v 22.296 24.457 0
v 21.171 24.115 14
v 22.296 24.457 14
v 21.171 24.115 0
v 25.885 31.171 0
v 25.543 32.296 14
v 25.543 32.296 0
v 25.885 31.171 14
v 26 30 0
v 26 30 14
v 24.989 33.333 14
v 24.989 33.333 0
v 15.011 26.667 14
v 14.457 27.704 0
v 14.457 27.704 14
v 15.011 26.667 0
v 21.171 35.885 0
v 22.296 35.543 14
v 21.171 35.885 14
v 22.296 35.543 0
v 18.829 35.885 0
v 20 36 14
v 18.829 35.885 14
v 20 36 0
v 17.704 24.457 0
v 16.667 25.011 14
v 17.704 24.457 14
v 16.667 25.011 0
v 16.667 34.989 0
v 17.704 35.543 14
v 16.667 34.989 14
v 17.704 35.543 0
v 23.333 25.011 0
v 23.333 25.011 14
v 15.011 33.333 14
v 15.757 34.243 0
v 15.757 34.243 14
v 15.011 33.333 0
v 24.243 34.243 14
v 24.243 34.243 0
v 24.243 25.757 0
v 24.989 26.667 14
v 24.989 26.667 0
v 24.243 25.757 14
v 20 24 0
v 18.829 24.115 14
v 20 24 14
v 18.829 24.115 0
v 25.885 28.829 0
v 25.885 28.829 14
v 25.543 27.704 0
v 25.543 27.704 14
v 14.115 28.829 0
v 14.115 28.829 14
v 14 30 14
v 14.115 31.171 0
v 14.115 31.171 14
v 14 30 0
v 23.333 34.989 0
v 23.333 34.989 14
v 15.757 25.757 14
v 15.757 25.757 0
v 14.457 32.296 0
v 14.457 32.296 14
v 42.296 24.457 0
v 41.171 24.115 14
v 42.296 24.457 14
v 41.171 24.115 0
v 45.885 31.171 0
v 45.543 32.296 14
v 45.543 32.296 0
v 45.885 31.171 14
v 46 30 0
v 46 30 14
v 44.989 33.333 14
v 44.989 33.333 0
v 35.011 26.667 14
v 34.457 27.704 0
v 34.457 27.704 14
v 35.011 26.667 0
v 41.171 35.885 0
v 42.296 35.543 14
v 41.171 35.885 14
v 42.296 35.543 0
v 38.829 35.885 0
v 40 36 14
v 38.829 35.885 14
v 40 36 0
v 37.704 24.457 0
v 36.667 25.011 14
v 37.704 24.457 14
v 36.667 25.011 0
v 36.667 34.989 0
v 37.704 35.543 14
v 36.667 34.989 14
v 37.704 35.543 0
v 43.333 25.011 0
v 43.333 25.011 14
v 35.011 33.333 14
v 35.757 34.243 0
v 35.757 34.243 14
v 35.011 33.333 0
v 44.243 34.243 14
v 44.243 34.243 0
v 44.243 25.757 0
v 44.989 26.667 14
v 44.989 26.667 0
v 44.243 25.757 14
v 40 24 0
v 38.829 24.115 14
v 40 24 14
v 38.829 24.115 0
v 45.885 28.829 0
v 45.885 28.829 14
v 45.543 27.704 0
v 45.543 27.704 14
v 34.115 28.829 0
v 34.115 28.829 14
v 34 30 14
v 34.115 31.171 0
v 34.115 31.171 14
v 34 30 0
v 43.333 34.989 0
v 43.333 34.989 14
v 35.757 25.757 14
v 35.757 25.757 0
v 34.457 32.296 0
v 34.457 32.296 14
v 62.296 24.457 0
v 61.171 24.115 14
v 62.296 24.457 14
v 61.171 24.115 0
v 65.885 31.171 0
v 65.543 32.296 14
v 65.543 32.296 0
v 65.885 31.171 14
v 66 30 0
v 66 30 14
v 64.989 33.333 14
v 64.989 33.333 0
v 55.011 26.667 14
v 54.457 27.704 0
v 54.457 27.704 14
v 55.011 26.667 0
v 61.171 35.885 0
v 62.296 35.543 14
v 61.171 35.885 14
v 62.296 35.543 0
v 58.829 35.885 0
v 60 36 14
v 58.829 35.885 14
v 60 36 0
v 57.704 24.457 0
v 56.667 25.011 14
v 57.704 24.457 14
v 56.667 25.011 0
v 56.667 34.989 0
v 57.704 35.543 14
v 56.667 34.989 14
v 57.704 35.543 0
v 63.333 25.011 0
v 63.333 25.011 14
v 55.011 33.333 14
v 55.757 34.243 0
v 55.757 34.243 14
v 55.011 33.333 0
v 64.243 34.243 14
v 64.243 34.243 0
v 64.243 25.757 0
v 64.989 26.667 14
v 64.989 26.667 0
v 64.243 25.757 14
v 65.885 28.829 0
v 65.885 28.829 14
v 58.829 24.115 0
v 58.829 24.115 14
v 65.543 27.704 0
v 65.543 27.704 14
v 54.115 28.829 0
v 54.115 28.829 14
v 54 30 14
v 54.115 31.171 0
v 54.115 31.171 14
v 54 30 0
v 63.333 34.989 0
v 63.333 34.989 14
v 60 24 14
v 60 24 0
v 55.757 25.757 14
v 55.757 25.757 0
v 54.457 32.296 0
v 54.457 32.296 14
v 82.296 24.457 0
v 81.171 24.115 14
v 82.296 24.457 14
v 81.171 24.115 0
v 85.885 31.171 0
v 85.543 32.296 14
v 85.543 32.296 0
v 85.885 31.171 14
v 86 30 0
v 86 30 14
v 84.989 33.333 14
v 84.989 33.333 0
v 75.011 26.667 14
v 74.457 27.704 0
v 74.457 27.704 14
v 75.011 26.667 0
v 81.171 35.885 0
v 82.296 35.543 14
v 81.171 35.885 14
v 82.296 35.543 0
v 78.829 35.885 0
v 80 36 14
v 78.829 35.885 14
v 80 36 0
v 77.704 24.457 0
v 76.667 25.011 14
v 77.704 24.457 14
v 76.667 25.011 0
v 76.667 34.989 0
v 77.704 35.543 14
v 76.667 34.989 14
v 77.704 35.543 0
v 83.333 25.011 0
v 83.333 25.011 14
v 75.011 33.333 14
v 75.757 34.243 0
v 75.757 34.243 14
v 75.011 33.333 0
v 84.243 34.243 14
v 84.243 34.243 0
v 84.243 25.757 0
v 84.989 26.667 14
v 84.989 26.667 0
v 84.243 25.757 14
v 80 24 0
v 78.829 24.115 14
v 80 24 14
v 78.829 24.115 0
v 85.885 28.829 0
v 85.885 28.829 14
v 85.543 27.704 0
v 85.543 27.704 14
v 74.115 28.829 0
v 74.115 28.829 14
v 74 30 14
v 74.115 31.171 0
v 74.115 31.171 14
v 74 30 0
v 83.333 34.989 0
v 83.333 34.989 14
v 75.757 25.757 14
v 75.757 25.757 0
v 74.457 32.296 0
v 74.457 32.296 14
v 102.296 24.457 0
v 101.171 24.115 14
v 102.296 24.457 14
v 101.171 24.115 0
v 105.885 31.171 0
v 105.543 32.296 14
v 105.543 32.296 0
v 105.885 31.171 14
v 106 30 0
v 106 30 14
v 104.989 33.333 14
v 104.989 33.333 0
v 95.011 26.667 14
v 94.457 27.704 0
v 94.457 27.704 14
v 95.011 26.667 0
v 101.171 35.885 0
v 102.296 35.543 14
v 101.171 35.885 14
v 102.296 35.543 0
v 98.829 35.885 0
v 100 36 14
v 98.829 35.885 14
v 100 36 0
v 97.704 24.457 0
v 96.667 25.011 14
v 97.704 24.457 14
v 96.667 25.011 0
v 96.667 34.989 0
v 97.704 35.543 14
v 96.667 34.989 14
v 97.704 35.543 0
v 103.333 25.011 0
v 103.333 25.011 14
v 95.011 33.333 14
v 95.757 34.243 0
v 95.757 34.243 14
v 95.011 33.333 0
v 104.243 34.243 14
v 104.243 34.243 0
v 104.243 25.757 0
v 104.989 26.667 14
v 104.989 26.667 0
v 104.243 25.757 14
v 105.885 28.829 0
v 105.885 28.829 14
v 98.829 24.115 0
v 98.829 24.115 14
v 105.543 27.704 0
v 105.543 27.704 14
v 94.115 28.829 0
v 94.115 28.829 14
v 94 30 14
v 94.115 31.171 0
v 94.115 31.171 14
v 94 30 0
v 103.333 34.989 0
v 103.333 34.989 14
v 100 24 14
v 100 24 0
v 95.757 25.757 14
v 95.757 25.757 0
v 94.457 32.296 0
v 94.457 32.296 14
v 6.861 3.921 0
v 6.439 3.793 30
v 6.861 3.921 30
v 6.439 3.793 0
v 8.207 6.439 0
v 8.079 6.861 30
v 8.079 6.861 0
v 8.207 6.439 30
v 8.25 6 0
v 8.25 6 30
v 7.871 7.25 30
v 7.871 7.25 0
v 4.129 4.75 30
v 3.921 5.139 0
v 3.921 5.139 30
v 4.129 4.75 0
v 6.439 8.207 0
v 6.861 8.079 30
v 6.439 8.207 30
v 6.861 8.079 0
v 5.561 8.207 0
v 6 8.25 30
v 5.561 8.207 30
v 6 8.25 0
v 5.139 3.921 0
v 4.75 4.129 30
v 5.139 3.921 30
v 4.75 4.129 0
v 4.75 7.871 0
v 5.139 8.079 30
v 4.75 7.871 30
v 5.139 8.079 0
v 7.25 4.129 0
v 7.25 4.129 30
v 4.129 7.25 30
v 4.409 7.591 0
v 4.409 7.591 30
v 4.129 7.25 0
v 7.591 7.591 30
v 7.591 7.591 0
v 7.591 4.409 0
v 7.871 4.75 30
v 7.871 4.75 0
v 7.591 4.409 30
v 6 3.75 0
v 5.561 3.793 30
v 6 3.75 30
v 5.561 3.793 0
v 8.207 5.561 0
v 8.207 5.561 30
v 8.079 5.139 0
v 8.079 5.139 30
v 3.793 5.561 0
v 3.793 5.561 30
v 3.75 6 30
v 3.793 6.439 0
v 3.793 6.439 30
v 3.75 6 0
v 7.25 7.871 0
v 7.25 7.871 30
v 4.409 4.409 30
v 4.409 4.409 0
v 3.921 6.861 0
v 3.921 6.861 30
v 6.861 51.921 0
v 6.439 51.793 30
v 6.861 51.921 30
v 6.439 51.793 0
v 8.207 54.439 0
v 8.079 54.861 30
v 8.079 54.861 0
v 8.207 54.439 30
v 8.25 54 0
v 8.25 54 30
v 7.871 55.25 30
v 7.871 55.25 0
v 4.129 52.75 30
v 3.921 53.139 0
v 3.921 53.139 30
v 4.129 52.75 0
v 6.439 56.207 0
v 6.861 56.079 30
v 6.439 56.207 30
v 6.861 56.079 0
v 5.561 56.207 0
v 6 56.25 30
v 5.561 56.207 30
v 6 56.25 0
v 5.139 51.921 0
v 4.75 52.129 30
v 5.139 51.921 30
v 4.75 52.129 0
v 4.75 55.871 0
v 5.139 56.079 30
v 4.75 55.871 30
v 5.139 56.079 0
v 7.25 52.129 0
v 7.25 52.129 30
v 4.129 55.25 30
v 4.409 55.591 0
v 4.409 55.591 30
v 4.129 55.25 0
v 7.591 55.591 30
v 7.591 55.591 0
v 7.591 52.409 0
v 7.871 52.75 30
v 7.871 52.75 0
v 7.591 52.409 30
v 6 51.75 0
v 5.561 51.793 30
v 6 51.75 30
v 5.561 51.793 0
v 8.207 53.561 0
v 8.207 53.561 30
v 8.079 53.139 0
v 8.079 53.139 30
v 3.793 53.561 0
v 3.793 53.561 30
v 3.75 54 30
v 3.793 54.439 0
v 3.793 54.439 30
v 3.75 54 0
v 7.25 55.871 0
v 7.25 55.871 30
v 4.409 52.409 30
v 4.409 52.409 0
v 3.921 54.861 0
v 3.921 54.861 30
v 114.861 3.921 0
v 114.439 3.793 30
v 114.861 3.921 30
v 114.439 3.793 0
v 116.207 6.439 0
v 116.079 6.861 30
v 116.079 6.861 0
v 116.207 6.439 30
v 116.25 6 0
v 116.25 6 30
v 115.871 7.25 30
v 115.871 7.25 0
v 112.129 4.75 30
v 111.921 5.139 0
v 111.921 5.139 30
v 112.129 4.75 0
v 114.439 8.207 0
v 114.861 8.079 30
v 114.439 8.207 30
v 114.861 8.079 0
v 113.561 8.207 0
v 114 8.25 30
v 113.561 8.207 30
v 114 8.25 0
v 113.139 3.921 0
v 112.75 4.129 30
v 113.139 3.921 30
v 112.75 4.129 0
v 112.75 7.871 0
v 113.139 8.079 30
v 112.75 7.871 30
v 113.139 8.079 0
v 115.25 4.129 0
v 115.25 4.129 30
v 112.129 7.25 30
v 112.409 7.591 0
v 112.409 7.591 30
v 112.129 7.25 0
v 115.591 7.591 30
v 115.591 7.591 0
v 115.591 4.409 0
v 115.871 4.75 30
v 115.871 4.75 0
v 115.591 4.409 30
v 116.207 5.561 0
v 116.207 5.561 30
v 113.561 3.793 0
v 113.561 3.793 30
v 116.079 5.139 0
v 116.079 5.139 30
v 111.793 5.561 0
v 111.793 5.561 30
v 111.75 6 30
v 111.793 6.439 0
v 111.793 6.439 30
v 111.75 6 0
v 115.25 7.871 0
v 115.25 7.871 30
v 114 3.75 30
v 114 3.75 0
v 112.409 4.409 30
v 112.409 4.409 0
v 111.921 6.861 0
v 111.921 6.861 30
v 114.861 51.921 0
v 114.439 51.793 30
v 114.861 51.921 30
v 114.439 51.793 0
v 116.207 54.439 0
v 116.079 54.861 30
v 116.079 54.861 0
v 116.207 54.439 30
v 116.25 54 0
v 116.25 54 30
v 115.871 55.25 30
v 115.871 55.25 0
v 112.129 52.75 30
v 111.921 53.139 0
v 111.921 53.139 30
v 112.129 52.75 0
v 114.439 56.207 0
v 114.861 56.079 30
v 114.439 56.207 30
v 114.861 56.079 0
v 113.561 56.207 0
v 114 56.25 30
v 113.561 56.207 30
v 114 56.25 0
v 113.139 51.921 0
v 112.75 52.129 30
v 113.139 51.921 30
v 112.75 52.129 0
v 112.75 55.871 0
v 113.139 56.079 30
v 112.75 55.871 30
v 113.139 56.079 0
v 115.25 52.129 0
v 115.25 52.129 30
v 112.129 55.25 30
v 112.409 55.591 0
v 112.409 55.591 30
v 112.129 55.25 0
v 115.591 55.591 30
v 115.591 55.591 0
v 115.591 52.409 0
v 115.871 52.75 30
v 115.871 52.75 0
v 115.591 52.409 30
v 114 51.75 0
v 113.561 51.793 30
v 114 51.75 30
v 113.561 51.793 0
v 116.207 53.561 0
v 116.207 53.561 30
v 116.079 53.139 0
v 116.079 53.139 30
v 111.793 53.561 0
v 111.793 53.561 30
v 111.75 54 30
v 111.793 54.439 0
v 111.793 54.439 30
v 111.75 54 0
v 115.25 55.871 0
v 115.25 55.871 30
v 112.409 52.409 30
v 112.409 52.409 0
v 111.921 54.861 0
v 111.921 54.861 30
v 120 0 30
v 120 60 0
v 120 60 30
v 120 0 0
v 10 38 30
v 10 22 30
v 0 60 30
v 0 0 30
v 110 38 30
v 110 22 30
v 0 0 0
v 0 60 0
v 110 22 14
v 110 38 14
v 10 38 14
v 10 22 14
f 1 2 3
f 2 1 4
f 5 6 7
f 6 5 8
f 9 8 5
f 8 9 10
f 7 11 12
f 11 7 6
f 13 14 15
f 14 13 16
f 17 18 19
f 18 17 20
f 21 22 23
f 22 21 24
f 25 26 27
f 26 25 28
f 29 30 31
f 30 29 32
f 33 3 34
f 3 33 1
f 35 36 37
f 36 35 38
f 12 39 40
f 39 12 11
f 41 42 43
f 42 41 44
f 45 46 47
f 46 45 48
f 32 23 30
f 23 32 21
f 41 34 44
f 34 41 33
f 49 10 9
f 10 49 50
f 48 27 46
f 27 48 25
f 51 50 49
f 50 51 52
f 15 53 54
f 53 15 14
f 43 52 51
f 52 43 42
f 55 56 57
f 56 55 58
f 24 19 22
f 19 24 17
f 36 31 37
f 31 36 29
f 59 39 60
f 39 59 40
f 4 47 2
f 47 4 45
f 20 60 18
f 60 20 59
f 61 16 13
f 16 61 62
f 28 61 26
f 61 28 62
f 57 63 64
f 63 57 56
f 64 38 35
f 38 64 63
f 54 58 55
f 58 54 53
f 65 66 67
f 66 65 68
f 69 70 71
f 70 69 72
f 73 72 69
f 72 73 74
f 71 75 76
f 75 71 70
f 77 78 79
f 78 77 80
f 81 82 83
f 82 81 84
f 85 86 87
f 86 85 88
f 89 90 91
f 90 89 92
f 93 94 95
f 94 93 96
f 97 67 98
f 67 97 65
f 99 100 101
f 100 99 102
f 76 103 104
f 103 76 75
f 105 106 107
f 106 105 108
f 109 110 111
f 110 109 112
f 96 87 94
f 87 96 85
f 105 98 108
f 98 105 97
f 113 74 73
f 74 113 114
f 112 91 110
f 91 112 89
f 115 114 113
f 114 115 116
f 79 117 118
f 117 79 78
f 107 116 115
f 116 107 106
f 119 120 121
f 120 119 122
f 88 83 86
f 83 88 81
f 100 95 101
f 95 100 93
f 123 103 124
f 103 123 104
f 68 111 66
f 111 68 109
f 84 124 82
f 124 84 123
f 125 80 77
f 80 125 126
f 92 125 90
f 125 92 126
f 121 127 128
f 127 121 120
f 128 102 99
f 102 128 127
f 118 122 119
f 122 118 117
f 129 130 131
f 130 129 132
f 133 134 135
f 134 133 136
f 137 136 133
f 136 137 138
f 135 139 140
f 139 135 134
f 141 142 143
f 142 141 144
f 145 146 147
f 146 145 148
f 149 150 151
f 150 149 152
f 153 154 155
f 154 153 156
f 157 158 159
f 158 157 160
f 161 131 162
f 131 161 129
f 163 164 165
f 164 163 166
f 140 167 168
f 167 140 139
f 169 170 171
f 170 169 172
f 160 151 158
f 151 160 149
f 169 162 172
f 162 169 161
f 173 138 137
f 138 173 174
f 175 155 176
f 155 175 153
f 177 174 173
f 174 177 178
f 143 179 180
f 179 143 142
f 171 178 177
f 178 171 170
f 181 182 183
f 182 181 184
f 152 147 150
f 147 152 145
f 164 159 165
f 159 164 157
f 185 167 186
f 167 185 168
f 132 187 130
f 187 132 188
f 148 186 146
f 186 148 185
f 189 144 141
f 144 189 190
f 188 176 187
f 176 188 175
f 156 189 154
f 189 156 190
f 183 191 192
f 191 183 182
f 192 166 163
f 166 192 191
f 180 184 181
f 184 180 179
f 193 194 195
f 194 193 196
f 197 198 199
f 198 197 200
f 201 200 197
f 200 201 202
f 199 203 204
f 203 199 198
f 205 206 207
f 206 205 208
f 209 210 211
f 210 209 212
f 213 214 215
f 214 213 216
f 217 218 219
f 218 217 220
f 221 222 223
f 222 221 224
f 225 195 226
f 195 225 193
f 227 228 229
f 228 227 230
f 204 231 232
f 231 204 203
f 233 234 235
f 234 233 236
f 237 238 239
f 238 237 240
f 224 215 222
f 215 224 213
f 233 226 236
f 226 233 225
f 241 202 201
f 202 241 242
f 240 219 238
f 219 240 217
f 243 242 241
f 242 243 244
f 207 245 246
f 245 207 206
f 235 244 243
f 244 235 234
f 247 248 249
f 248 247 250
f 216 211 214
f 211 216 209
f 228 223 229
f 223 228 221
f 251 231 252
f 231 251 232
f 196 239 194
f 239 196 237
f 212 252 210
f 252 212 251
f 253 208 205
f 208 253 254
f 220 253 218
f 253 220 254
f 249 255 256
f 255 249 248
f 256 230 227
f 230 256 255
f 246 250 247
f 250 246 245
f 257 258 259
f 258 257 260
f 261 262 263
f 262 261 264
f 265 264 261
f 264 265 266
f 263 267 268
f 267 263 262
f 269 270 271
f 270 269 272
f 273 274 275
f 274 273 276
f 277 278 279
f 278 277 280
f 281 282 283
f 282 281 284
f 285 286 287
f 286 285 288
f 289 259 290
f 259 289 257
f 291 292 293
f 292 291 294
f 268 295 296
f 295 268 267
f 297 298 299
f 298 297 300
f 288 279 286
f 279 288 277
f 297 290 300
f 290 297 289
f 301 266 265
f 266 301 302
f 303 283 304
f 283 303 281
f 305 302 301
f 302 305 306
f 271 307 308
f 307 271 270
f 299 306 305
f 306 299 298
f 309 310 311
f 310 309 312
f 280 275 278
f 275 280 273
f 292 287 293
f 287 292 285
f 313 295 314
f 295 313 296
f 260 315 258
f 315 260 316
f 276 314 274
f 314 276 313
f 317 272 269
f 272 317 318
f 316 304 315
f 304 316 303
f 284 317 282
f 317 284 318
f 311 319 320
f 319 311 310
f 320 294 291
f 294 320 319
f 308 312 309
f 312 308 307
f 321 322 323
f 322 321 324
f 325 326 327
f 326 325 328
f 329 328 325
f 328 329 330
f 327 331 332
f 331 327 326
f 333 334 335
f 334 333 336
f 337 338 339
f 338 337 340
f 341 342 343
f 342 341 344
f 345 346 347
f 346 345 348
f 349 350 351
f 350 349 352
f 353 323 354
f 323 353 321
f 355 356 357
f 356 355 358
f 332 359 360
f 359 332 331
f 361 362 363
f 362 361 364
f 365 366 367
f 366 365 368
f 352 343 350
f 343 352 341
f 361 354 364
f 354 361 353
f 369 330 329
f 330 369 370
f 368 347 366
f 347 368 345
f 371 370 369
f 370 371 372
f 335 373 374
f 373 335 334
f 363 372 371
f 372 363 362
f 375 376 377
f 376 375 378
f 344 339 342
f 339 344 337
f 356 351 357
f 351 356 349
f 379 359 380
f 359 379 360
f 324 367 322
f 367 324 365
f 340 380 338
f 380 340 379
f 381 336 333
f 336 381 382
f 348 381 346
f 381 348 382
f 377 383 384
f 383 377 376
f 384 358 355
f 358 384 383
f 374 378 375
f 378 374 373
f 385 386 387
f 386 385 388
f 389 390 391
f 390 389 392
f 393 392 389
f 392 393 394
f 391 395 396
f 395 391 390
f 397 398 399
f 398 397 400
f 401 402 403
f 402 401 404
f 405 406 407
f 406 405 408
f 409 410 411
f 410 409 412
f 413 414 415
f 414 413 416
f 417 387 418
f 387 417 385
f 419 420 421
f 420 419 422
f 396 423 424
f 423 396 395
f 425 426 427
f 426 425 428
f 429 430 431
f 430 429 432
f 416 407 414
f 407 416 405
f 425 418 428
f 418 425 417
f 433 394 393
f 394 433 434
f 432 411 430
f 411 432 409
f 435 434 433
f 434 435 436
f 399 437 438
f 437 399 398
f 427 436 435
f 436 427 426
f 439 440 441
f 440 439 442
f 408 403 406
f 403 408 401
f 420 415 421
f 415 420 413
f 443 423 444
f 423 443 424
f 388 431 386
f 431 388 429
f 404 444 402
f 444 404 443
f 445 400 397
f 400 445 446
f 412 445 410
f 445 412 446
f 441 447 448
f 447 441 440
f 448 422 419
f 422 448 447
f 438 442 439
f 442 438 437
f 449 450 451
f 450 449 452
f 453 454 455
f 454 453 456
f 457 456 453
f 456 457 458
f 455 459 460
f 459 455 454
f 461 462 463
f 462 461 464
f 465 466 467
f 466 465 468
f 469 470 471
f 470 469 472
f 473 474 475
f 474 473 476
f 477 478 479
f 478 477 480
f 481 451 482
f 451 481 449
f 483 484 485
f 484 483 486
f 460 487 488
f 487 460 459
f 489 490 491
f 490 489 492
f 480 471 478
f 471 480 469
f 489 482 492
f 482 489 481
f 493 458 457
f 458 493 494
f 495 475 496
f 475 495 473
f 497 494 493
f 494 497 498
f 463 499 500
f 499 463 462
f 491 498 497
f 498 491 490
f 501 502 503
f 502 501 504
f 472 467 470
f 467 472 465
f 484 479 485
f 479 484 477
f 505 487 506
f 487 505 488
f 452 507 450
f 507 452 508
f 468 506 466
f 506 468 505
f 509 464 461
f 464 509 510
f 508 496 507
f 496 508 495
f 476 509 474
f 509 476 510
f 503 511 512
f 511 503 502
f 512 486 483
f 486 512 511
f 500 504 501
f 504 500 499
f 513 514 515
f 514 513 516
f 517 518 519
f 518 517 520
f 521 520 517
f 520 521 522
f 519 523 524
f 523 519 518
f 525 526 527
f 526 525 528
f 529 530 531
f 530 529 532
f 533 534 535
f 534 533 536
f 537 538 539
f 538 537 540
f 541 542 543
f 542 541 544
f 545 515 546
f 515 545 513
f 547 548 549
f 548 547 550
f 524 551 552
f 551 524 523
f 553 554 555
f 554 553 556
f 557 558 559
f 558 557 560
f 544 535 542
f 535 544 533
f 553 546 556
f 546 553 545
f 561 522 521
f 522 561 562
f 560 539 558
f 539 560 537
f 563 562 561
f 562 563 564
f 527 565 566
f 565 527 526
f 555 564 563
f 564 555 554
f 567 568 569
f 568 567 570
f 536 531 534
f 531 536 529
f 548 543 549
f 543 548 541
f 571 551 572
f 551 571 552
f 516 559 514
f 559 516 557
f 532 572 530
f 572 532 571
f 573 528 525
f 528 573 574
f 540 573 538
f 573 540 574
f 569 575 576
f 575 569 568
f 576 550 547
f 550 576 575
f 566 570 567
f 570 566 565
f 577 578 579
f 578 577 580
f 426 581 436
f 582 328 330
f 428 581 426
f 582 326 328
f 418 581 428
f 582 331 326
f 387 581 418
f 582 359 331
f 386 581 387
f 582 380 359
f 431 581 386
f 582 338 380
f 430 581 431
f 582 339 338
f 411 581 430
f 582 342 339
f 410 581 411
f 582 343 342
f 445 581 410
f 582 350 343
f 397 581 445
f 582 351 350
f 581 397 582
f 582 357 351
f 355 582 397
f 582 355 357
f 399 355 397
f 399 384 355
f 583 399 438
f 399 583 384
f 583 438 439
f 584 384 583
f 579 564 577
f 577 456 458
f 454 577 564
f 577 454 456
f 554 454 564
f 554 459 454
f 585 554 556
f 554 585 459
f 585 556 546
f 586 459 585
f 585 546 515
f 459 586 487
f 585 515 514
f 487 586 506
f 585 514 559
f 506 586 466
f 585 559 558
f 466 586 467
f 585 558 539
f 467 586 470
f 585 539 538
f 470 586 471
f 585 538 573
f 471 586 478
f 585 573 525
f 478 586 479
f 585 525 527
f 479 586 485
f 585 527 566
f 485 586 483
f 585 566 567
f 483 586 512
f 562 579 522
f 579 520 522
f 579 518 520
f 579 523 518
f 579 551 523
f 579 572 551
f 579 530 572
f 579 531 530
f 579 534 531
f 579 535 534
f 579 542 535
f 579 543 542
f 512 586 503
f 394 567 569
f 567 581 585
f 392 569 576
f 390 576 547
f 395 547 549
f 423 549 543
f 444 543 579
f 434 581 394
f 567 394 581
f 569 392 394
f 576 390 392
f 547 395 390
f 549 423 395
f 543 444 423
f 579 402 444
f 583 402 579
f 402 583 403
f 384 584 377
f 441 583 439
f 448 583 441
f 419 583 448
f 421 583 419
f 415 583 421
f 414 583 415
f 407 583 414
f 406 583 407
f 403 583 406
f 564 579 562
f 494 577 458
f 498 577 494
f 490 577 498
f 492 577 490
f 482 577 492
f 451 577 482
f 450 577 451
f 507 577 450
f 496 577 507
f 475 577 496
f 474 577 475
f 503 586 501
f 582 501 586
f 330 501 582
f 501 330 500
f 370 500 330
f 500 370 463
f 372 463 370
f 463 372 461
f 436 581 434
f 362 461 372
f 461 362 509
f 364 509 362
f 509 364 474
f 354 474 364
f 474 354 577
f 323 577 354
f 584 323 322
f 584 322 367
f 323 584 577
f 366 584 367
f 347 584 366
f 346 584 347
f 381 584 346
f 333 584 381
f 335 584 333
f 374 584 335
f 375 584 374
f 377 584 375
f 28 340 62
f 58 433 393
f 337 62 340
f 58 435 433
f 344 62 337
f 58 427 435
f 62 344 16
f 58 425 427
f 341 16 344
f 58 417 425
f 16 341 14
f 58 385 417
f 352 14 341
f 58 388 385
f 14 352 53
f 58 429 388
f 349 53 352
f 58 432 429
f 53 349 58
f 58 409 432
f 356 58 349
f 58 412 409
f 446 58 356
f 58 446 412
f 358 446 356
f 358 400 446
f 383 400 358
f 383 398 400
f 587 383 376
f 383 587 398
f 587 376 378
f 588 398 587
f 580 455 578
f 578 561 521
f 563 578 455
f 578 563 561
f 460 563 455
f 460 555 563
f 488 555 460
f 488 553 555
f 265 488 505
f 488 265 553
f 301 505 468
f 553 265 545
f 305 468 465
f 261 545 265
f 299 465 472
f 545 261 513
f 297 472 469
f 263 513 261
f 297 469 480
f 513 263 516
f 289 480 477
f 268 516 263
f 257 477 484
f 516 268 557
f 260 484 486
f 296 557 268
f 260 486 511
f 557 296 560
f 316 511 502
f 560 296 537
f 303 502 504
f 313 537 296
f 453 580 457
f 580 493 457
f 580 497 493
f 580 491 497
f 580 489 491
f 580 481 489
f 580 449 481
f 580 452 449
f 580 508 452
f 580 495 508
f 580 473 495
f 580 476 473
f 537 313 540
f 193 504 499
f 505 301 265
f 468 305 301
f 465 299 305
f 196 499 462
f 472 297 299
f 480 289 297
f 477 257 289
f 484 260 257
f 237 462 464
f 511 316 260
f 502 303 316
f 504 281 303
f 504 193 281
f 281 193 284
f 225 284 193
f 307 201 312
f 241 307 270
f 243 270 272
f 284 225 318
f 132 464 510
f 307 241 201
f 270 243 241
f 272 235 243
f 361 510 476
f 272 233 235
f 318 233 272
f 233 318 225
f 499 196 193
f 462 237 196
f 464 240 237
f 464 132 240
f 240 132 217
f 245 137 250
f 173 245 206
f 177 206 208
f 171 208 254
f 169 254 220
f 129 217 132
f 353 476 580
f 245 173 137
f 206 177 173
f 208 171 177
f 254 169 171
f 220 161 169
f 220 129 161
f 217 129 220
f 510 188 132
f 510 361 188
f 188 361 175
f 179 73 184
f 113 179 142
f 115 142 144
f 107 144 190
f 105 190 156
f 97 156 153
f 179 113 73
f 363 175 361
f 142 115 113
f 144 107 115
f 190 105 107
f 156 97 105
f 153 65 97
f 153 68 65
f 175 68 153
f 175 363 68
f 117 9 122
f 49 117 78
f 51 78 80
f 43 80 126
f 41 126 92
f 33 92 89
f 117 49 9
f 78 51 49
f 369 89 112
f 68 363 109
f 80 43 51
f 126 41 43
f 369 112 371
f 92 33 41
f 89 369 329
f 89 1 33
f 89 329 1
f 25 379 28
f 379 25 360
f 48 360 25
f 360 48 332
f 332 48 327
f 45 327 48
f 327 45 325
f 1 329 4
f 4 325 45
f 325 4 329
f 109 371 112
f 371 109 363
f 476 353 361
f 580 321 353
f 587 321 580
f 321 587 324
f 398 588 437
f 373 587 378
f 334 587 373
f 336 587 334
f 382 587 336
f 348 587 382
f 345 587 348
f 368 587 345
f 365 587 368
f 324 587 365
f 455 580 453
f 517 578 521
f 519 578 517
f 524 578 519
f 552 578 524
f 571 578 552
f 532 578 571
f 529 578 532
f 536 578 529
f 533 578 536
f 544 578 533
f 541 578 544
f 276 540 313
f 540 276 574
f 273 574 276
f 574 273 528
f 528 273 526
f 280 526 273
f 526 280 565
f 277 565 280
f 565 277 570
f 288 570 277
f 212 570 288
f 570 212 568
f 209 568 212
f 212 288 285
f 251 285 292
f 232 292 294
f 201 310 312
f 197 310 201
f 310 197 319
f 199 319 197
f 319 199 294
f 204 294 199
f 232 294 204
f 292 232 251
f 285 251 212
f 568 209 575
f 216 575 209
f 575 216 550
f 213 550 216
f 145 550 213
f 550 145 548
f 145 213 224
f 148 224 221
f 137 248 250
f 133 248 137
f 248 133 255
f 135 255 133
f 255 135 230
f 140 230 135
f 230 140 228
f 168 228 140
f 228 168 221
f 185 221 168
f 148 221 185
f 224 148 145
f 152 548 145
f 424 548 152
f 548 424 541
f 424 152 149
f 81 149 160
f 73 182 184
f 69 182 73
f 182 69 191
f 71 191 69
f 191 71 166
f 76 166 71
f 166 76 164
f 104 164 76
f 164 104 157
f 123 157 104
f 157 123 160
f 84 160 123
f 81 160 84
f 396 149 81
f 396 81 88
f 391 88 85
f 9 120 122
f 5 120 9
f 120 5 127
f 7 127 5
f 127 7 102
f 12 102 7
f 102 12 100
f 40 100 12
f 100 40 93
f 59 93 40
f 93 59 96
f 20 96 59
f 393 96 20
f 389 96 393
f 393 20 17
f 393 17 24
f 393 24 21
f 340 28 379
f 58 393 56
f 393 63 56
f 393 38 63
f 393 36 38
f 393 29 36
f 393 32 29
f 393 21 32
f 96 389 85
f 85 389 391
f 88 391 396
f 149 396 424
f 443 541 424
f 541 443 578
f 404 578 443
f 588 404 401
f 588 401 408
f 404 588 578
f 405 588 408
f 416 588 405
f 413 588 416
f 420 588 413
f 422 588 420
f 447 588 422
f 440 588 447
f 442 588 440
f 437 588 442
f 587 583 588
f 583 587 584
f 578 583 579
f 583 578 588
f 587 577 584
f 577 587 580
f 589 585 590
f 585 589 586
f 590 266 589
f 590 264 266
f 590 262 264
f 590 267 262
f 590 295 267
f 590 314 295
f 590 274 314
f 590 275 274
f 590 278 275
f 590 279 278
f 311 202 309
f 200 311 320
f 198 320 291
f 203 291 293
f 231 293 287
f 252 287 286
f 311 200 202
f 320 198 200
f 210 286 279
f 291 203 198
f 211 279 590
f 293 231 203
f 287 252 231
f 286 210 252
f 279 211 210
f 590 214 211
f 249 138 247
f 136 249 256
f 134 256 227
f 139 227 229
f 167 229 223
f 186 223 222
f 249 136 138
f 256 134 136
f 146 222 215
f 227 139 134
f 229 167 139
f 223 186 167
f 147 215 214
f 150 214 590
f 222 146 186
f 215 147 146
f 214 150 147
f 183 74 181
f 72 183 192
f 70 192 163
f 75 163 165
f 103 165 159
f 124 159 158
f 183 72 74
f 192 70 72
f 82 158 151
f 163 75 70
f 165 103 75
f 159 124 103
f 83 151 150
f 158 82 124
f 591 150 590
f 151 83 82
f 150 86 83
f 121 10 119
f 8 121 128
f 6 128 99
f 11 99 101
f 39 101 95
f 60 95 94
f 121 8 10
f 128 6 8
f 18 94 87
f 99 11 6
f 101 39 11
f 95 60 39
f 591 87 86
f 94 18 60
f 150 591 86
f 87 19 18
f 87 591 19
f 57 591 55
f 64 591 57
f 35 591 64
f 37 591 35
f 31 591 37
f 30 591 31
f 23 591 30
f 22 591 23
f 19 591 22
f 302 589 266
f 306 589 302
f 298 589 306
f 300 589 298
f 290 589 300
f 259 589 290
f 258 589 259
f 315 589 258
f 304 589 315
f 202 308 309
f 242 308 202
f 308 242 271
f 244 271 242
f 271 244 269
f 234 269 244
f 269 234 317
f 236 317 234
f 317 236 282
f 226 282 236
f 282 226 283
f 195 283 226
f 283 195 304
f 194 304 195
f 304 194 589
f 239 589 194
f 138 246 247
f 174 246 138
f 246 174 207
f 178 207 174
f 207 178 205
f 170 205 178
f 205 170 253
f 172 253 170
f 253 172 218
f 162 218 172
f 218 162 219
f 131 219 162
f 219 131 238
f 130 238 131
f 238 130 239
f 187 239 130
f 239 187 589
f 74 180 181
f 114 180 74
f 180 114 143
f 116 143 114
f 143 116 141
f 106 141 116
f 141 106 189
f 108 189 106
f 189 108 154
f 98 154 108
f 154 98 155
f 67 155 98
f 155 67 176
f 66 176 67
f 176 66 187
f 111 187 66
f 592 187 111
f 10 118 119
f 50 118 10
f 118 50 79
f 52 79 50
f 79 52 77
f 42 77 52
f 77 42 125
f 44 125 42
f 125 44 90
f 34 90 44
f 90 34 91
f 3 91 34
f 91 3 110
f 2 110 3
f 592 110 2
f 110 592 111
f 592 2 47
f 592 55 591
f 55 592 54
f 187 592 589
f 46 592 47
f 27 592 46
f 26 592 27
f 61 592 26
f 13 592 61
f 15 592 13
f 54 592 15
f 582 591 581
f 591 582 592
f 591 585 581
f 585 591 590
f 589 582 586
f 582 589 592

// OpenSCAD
$fn = 32;

// ----------------------------------------------------------------------
// Manifold block: gallery_top manifold
// ----------------------------------------------------------------------

// --- parameters (mm) ---
block_l = 120;            // block length, X
block_w = 60;             // block width, Y
block_h = 30;             // block height, Z
port_d = 12;              // port bore diameter
port_pitch = 20;          // port pitch along X
gallery_d = 16;           // top gallery width, Y
gallery_depth = 16;       // gallery pocket depth
wall_p = 10;              // gallery end wall thickness, X
mnt_d = 4.5;              // mounting hole diameter
mnt_in = 6;               // mounting hole inset from the edges

n_ports = 5;  // ports in the row
port_x0 = (block_l - (n_ports - 1) * port_pitch) / 2;  // first port X

difference() {
  cube([block_l, block_w, block_h]);
  for (i = [0 : n_ports - 1])
    translate([port_x0 + i * port_pitch, block_w / 2, -1])
      cylinder(h = block_h + 2, d = port_d);
  translate([wall_p, block_w / 2 - gallery_d / 2, block_h - gallery_depth])
    cube([block_l - 2 * wall_p, gallery_d, gallery_depth + 1]);
  for (cx = [mnt_in, block_l - mnt_in])
    for (cy = [mnt_in, block_w - mnt_in])
      translate([cx, cy, -1]) cylinder(h = block_h + 2, d = mnt_d);
}
